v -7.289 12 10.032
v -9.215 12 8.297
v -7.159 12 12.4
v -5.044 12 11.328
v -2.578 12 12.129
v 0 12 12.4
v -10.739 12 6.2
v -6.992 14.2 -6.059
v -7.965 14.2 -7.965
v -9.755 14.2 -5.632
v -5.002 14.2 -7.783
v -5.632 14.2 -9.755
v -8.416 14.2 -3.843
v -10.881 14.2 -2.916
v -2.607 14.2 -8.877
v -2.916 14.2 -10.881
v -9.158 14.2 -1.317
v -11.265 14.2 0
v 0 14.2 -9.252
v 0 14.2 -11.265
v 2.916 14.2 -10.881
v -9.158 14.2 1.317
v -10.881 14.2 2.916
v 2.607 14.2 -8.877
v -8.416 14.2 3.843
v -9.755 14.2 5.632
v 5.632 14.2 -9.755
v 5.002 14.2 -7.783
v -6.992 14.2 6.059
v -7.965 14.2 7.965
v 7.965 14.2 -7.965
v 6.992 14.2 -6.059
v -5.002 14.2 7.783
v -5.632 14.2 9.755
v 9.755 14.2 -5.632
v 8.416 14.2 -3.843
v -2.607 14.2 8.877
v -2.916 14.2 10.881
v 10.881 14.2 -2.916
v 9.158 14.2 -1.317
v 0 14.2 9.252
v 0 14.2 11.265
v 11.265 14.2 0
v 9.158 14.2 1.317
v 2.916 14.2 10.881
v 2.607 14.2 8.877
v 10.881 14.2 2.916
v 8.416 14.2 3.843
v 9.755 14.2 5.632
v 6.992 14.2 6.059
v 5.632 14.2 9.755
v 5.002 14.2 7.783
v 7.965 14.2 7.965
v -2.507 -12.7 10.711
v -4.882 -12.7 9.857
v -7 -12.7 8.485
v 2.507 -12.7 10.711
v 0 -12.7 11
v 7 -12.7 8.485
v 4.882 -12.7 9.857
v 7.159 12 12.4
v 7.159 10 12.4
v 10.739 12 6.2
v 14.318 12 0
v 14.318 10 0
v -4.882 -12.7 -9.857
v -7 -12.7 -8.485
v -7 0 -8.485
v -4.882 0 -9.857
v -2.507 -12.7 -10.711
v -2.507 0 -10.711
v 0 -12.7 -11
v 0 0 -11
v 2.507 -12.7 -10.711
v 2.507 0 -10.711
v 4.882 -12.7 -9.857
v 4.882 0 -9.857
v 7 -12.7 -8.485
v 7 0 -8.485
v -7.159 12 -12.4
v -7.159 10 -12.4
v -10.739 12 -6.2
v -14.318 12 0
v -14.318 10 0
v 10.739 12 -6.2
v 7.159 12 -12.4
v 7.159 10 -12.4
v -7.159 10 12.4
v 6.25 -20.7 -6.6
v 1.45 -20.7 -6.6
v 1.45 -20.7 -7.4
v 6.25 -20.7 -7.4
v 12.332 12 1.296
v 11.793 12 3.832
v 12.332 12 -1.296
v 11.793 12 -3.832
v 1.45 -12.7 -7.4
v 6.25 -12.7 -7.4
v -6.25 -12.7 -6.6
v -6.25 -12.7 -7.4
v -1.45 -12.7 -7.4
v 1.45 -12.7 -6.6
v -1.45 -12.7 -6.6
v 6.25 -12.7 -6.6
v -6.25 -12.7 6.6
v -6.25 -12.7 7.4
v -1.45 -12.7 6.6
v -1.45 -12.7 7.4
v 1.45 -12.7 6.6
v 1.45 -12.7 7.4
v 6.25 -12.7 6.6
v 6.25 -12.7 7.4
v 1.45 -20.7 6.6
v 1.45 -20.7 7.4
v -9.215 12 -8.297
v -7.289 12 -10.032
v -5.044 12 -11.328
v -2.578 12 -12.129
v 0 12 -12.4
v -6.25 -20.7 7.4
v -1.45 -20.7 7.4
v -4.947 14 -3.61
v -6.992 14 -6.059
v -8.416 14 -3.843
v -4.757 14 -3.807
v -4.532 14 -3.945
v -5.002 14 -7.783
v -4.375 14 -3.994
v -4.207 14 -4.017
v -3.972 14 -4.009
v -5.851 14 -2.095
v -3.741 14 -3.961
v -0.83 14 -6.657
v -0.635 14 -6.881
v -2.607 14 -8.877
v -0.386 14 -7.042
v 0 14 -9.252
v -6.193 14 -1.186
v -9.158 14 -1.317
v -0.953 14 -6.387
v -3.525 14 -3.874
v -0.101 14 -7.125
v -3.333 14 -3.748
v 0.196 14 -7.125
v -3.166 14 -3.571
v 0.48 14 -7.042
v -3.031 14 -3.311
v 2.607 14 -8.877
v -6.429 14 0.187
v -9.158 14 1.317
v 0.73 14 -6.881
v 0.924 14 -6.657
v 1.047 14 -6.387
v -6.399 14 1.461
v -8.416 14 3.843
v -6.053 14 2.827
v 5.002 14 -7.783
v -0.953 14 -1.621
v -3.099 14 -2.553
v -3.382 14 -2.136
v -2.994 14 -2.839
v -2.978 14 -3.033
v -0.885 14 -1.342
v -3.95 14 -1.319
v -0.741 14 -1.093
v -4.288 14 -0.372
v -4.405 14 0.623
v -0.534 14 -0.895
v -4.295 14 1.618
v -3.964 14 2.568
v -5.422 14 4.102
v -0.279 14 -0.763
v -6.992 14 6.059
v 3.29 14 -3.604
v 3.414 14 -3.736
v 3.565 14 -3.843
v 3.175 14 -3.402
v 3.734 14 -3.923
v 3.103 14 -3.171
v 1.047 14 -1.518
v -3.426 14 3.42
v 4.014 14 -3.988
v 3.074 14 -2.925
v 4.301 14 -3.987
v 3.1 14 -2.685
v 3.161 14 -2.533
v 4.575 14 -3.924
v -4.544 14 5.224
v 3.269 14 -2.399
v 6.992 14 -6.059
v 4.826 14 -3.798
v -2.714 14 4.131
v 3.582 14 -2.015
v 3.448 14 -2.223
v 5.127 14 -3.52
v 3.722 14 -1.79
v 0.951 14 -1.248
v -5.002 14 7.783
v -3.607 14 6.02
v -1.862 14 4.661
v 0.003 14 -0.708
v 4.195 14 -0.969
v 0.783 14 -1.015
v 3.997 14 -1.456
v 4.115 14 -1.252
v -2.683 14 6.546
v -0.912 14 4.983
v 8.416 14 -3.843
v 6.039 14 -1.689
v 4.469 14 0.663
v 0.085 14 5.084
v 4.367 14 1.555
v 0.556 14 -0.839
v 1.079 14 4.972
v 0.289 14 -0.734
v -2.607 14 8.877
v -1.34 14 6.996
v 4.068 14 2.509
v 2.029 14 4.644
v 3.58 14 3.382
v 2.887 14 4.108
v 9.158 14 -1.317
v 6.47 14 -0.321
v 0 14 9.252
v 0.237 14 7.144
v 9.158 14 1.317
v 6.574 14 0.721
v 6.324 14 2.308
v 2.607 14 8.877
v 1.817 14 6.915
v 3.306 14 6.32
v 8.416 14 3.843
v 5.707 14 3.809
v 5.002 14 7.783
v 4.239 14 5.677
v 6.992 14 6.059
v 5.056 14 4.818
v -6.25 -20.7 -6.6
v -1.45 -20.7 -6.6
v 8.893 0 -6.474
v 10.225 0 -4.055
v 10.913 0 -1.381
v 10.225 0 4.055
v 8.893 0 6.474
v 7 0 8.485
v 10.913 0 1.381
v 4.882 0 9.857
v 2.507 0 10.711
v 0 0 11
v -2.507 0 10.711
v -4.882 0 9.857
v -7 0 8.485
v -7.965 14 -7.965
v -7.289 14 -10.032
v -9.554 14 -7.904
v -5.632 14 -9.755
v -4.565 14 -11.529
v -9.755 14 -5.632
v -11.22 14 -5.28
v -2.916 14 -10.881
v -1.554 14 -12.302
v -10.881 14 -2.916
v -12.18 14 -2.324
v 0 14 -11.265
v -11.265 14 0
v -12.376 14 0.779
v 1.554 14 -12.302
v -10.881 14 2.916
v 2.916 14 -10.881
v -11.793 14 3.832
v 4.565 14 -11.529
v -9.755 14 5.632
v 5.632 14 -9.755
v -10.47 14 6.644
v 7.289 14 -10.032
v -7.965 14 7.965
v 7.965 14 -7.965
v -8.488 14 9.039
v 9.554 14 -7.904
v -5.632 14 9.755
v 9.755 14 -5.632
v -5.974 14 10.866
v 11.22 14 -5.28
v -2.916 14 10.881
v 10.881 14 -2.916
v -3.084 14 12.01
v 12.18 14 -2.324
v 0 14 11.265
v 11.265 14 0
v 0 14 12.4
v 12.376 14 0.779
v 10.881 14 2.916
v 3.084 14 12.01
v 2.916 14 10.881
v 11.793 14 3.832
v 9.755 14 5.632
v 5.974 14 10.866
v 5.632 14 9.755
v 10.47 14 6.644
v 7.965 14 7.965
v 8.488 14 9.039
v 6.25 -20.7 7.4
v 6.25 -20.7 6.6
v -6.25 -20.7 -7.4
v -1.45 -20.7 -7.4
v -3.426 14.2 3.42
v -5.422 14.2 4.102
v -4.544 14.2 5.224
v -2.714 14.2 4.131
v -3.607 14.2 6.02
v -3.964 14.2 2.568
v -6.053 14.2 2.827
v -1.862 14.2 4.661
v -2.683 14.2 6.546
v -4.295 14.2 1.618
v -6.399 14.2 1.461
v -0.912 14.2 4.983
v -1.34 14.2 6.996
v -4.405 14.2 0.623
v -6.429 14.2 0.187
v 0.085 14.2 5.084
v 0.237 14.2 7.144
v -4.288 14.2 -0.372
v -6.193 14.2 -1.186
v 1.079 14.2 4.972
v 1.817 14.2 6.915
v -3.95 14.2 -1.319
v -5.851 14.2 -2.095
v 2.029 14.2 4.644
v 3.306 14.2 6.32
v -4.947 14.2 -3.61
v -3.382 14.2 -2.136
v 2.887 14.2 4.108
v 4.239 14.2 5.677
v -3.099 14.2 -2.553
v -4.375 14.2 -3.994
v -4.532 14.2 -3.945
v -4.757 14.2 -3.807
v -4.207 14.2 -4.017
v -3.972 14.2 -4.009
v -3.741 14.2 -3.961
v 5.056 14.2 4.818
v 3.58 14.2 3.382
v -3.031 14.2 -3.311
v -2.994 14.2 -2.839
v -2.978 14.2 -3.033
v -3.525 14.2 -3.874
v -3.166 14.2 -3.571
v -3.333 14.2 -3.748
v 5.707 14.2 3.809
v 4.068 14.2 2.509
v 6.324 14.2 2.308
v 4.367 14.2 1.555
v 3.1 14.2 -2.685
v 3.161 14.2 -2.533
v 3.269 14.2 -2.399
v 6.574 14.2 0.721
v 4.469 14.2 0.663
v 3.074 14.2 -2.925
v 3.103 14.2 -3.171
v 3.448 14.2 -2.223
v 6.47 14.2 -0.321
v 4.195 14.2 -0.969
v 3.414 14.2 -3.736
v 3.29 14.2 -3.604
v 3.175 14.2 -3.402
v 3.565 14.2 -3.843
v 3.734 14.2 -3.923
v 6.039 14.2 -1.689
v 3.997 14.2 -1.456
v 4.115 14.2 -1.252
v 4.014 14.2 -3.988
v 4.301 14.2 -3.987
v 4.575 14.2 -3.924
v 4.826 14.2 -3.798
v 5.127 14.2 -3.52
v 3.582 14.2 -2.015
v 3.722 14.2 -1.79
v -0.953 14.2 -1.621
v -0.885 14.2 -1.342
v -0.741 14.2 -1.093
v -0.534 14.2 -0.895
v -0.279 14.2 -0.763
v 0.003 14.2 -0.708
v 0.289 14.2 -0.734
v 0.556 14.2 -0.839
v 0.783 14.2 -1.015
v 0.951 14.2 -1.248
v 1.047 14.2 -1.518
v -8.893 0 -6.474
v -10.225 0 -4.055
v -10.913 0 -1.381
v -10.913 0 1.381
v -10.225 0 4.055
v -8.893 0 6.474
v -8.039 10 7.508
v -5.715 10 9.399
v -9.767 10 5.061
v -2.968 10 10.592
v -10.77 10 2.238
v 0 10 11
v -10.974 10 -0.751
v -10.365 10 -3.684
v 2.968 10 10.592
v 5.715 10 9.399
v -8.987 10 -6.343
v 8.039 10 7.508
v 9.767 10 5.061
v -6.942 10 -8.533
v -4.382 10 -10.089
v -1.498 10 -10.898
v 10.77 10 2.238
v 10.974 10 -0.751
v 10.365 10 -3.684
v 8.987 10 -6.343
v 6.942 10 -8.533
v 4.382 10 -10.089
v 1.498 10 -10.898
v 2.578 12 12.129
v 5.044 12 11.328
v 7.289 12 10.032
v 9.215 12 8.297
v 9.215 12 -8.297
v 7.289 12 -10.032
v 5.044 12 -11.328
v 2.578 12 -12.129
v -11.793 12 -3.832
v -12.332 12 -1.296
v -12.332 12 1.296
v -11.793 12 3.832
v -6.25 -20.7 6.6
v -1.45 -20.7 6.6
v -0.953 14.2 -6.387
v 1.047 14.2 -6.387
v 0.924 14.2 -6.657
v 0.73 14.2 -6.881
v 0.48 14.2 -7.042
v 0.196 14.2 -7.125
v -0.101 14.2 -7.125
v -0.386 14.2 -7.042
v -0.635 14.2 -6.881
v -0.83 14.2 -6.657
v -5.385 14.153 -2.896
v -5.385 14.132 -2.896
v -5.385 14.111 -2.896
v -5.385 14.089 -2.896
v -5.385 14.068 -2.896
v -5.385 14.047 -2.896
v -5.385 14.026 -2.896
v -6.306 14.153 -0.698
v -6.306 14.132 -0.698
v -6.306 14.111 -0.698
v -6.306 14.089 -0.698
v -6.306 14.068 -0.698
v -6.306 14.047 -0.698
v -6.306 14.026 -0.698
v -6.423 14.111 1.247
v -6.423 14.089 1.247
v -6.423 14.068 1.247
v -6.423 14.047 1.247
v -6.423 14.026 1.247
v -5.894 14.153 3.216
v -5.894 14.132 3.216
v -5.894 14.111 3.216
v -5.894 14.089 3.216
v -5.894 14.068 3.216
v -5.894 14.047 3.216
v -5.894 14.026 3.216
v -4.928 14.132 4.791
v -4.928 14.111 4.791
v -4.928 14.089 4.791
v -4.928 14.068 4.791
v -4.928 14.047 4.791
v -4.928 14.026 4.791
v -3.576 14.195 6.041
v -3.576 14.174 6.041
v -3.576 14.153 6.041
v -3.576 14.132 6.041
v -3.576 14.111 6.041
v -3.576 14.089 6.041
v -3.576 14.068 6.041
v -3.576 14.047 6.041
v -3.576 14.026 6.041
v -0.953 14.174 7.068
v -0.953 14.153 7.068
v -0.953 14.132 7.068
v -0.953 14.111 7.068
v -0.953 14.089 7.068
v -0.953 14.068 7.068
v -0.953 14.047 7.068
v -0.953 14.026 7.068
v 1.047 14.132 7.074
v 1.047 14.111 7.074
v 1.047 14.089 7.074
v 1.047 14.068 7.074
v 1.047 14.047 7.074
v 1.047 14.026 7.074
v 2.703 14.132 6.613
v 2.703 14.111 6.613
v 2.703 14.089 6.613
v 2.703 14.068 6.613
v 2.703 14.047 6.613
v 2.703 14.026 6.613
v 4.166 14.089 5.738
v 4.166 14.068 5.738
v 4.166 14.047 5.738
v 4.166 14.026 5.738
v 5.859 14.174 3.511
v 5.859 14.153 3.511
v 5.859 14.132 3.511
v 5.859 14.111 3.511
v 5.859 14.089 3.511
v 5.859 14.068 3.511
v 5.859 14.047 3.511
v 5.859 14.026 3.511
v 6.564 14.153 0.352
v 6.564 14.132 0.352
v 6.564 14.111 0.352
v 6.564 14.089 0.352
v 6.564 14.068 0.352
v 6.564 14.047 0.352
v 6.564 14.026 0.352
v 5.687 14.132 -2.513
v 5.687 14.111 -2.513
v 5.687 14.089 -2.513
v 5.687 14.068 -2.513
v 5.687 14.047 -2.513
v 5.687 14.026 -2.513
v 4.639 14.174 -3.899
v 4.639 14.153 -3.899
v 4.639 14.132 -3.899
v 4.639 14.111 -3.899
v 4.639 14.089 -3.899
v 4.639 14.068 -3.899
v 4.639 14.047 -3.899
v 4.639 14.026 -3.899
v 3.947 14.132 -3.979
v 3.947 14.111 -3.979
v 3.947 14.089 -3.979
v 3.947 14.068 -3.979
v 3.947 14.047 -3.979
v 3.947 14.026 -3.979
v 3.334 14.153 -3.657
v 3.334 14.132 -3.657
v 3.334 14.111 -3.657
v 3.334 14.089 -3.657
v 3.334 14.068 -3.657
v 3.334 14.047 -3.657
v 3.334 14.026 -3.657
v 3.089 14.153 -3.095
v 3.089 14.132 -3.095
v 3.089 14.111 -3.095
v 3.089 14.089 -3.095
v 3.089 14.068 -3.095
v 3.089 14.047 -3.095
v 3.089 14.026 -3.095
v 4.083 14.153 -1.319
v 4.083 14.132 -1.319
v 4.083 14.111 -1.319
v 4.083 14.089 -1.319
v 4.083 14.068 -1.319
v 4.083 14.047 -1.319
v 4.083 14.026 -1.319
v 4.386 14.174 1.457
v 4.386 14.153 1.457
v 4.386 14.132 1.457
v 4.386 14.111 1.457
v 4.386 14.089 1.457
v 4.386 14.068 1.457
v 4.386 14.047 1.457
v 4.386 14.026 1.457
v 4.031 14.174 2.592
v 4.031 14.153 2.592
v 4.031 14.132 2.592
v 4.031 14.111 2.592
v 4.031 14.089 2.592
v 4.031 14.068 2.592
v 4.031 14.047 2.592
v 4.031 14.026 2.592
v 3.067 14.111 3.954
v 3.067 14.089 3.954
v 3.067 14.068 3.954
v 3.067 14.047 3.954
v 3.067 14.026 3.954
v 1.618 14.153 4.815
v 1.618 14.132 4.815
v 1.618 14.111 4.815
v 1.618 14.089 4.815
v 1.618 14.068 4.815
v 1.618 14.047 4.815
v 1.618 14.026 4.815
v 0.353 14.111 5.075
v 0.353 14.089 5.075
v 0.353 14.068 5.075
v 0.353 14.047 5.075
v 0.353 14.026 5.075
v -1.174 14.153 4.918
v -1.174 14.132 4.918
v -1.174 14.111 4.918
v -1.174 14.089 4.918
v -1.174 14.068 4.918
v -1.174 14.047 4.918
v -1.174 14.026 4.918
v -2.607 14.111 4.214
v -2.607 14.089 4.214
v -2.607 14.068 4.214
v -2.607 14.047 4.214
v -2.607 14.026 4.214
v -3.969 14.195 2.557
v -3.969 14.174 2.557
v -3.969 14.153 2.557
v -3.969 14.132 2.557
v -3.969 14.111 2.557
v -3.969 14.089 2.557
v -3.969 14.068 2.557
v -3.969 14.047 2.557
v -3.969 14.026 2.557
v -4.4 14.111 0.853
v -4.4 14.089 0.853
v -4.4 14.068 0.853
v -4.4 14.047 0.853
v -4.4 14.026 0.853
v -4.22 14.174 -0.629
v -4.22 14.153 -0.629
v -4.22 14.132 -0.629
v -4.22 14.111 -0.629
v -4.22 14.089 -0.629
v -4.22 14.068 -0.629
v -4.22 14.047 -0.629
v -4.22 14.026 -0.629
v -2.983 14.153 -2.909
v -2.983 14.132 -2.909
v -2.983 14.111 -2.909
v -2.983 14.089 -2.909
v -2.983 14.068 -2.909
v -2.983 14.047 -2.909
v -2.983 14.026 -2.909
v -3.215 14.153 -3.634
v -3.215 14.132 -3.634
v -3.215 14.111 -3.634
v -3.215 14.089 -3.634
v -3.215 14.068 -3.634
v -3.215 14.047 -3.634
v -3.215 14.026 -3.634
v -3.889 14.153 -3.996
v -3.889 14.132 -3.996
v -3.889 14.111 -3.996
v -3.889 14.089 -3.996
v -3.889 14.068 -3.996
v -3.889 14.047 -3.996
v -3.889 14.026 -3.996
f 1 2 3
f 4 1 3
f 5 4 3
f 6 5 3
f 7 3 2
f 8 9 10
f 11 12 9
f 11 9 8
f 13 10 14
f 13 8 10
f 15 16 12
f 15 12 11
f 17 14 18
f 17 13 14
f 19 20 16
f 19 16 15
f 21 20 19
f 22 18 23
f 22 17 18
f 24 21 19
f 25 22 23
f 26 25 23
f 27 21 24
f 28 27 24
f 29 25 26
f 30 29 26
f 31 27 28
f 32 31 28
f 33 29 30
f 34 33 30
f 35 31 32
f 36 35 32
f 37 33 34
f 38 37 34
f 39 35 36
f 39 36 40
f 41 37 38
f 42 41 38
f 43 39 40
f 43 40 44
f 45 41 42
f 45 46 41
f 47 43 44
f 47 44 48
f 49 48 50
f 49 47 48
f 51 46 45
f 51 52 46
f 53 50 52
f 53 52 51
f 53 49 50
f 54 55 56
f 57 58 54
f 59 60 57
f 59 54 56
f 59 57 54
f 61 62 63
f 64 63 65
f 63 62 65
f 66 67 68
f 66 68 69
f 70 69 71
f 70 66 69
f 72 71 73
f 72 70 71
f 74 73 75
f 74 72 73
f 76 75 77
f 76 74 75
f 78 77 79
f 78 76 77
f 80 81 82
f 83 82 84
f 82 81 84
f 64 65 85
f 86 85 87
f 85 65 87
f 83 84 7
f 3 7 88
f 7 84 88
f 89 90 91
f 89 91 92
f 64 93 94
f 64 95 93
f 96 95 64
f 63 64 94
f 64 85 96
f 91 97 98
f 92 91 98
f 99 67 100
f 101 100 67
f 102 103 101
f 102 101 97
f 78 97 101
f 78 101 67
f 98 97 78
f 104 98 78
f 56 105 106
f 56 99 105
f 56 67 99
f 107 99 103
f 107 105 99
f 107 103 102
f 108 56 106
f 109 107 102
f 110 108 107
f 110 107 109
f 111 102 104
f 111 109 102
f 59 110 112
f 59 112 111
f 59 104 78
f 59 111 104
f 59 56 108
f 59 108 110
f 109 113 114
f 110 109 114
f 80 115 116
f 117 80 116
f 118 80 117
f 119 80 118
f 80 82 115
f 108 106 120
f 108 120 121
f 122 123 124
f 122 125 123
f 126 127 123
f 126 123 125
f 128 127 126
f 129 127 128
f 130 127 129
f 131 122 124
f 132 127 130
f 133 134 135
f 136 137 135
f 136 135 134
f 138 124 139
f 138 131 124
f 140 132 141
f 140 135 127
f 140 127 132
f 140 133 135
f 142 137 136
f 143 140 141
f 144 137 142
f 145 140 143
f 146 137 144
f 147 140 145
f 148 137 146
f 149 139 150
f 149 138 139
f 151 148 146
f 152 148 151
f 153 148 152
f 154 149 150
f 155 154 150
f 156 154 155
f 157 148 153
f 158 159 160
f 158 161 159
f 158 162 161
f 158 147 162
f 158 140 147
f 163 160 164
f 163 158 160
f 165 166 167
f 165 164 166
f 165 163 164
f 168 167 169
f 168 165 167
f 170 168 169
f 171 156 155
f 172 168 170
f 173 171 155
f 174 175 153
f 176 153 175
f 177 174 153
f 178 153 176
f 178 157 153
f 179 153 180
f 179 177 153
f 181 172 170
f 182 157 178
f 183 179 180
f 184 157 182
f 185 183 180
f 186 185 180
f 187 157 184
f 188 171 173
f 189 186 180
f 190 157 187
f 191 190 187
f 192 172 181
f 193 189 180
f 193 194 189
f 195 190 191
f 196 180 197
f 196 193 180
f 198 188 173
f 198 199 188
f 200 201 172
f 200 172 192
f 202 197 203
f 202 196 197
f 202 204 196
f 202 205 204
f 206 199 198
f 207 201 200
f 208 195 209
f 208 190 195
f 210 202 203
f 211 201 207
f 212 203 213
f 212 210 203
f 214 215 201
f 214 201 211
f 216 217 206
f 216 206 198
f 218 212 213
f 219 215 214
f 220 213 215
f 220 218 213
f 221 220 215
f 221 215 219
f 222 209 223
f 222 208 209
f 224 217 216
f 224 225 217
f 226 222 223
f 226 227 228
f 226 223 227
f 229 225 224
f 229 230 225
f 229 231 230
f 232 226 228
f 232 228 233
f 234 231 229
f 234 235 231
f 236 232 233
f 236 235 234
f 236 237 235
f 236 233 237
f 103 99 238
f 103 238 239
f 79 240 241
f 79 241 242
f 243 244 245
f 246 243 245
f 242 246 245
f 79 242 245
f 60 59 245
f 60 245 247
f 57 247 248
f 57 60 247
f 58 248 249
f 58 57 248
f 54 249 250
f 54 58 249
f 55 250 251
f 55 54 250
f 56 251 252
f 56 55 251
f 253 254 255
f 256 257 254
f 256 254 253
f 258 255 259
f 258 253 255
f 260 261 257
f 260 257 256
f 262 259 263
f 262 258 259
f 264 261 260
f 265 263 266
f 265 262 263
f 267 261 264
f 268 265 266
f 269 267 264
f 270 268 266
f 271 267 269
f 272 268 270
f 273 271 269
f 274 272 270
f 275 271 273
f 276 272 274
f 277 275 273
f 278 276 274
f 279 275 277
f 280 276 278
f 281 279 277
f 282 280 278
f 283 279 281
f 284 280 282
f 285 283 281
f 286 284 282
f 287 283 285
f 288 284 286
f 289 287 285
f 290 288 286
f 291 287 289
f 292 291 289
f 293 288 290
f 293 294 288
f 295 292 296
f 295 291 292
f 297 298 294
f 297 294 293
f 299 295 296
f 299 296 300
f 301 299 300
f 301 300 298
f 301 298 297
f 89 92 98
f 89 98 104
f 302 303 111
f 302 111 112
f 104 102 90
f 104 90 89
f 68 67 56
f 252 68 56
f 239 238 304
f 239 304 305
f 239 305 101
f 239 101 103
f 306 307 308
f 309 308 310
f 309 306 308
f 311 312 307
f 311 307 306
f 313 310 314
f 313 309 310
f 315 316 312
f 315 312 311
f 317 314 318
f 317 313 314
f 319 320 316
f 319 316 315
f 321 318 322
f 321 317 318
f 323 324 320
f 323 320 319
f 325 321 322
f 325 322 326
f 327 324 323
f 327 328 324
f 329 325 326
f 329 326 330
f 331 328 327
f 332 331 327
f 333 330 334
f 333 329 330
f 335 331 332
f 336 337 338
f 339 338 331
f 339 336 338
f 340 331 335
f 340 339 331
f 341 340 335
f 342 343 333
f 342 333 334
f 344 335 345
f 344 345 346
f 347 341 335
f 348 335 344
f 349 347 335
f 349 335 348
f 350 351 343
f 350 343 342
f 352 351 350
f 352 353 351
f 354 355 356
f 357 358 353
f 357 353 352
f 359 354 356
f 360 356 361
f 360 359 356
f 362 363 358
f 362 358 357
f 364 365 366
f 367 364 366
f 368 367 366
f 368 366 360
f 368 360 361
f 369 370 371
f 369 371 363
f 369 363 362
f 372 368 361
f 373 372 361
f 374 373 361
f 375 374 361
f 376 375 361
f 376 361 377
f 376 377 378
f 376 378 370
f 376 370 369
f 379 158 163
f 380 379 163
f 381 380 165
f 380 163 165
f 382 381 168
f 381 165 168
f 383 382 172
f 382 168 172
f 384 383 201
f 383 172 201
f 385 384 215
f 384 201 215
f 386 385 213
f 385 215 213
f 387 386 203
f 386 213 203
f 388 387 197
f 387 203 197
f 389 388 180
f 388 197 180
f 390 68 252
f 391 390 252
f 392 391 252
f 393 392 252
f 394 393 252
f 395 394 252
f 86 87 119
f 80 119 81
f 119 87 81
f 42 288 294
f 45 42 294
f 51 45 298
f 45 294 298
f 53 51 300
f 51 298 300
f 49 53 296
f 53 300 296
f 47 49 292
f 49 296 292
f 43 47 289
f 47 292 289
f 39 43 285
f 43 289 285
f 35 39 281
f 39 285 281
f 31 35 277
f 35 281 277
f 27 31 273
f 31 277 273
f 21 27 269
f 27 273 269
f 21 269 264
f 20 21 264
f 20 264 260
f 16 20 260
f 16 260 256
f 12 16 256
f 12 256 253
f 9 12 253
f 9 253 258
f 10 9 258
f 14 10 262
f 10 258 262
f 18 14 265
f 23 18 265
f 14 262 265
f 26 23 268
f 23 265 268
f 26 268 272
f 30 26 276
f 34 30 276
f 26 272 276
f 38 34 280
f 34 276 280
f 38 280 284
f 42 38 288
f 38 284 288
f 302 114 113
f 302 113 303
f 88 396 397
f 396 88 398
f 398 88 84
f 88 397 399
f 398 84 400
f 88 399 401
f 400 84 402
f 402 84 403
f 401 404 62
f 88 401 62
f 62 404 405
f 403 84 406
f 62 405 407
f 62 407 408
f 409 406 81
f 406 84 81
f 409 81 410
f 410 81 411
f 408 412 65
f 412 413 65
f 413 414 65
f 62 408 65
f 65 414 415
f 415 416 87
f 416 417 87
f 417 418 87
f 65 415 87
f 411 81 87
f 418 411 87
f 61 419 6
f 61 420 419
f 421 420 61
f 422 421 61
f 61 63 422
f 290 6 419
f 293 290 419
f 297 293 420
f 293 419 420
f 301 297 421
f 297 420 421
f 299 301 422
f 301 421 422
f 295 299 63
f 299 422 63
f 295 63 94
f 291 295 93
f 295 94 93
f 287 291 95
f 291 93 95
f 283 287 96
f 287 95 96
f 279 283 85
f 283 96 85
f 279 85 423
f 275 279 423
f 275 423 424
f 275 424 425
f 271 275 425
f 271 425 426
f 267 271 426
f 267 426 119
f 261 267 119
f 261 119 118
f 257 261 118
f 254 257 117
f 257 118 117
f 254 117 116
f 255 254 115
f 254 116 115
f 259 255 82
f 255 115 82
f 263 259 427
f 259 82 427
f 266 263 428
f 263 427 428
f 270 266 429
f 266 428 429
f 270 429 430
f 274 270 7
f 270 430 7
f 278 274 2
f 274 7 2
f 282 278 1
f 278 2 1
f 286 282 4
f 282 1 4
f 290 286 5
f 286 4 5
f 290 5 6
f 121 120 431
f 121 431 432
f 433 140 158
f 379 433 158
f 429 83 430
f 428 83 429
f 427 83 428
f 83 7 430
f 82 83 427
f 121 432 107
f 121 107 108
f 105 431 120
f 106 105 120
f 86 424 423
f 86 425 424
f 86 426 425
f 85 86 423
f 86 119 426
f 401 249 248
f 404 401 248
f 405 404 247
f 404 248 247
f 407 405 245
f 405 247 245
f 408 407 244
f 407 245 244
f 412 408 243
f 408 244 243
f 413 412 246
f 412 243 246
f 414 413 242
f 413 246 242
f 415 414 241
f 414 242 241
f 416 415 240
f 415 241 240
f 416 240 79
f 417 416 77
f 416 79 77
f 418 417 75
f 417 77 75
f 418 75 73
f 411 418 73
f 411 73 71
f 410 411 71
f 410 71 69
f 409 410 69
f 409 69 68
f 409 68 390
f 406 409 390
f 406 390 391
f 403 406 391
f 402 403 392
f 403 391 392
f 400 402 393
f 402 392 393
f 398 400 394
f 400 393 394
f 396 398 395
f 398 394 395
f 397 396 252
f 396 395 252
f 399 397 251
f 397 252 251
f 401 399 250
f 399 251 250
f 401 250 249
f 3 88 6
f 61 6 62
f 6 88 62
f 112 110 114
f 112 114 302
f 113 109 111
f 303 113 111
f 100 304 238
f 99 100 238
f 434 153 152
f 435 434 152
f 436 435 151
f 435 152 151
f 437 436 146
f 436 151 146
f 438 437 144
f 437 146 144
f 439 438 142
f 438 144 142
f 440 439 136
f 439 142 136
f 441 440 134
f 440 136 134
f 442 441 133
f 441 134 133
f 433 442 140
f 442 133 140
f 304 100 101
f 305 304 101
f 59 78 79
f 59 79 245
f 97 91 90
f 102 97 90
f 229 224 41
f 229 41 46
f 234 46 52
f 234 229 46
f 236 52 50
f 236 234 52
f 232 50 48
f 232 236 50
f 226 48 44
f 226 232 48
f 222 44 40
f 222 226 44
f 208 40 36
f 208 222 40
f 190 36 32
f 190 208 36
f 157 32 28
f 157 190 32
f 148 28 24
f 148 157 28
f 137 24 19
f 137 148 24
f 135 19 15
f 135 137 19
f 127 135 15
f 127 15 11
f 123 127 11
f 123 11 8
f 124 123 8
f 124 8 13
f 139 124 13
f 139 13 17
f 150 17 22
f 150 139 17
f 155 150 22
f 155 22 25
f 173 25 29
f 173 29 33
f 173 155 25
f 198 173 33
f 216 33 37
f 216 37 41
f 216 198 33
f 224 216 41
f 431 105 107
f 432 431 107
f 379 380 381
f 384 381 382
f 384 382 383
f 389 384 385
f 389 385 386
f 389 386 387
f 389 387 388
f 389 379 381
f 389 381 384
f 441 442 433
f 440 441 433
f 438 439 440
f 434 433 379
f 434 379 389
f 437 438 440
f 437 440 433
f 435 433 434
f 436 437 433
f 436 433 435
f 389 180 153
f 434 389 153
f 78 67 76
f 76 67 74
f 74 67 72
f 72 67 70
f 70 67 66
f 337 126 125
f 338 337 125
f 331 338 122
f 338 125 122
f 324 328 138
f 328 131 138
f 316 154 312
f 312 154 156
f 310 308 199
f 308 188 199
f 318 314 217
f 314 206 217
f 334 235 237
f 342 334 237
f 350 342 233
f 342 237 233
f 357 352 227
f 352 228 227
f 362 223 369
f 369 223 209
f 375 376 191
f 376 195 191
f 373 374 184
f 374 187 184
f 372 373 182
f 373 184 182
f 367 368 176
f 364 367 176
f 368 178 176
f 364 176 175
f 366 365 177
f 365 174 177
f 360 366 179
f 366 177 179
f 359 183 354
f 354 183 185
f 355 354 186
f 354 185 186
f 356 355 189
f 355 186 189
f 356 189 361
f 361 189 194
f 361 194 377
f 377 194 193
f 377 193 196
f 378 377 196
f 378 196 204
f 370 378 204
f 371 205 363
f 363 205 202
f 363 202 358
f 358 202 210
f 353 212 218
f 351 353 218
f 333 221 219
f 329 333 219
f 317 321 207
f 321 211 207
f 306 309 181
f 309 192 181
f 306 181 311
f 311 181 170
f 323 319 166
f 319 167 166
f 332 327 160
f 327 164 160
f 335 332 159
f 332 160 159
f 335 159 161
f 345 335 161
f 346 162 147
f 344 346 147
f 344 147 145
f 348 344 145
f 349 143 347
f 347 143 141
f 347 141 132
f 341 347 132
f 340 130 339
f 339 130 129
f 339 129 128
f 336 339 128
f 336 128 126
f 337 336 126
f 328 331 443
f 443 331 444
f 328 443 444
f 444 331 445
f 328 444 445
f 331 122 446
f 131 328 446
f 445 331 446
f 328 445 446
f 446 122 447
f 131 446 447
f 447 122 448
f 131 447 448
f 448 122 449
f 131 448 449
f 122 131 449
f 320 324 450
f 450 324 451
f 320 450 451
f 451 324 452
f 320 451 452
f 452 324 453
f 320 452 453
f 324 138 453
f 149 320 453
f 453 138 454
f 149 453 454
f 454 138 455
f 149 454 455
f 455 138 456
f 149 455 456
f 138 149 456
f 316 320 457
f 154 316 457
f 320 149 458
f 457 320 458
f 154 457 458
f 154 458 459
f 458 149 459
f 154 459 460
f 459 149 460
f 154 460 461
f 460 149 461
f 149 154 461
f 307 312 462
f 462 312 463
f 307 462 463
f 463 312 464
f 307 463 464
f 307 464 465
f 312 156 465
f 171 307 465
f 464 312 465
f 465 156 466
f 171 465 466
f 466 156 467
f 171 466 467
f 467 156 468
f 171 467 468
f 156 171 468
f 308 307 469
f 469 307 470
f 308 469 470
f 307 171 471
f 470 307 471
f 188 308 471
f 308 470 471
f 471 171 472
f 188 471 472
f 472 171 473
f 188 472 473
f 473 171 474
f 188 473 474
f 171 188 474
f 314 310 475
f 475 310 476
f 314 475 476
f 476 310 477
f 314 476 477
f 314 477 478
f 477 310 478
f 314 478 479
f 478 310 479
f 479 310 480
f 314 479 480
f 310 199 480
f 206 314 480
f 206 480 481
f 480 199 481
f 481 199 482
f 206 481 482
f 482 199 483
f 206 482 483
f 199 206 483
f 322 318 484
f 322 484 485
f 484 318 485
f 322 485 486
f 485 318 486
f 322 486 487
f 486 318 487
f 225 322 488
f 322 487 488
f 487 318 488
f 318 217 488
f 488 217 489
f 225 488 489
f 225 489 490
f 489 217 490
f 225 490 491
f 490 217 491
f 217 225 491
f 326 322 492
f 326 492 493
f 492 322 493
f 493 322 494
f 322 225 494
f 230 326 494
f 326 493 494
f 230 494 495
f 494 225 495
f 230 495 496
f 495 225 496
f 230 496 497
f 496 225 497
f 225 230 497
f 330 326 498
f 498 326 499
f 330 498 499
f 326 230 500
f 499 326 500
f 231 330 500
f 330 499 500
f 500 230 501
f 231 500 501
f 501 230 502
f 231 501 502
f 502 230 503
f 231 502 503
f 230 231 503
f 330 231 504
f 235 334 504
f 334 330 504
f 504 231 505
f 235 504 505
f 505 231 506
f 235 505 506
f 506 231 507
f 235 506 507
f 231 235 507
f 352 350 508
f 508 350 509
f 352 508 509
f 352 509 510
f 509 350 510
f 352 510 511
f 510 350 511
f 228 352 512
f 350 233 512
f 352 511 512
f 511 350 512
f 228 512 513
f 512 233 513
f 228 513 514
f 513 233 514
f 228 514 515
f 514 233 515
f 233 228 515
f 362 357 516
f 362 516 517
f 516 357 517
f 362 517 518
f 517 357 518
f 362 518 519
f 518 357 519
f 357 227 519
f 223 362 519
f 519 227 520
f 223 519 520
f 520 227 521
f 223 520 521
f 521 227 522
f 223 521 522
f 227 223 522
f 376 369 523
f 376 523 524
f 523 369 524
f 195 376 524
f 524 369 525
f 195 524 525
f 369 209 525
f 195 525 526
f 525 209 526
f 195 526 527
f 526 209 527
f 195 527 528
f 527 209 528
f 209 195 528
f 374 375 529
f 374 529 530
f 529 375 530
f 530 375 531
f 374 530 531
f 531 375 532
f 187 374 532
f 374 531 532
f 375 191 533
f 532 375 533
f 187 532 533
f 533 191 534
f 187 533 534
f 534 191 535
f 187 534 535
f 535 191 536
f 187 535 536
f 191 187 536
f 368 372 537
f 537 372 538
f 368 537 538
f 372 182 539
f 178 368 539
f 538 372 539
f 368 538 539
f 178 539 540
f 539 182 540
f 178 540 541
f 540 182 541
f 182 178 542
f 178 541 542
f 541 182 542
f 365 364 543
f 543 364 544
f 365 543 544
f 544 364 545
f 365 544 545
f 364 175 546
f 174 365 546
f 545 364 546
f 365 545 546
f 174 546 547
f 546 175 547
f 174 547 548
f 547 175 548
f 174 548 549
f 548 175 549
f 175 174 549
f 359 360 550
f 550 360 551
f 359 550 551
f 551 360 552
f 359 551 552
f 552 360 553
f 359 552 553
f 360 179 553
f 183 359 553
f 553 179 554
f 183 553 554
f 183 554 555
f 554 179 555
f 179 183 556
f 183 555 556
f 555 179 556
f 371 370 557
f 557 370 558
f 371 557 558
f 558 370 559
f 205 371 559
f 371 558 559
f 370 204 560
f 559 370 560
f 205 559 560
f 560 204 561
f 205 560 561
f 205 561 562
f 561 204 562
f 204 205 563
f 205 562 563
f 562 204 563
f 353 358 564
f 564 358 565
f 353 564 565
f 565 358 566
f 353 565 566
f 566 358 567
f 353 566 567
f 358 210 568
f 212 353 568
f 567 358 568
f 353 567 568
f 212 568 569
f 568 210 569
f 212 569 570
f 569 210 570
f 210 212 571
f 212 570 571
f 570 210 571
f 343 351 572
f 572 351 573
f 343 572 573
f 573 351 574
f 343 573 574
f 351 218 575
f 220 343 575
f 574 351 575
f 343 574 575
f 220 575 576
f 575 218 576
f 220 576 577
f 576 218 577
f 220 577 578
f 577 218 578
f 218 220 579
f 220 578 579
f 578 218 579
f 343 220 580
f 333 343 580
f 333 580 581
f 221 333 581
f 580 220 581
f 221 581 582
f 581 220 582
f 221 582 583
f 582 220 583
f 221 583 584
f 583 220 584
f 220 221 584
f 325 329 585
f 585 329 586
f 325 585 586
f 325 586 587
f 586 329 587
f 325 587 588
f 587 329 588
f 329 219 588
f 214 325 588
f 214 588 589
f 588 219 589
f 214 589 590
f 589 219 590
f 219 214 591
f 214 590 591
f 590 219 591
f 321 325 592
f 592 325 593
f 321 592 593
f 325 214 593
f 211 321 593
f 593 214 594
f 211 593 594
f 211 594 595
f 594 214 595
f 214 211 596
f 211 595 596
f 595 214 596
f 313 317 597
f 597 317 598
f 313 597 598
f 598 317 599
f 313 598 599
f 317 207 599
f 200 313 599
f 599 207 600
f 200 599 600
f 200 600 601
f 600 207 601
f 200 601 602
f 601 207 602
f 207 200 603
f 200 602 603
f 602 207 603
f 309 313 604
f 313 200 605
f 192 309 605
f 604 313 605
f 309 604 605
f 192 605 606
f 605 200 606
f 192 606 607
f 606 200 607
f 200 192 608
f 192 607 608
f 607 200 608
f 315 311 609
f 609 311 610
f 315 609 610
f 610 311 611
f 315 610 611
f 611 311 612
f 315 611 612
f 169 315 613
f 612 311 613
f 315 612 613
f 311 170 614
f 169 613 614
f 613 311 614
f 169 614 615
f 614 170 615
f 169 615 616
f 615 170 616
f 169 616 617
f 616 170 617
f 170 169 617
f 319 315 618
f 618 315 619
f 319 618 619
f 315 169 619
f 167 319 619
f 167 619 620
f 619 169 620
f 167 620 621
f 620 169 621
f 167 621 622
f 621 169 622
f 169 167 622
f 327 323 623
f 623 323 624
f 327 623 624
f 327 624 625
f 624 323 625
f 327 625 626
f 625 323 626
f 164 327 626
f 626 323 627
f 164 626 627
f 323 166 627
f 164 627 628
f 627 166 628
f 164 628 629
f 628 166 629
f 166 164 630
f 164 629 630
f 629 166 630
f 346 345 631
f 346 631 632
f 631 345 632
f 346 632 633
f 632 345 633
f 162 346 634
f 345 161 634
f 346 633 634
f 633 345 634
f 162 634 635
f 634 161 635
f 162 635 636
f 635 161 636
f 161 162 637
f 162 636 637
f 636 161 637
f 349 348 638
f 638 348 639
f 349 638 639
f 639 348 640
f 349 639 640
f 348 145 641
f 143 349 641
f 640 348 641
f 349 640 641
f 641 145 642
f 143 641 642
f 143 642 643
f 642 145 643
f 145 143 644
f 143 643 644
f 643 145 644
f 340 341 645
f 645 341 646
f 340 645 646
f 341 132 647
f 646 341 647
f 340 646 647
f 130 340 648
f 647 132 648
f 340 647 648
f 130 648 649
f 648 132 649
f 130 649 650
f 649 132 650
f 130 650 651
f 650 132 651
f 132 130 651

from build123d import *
from build123d.topology import SkipClean

# Parameters (mm, degrees)
SKETCH_1_R      = 11
EXTRUDE_1_DEPTH = 10
EXTRUDE_2_DEPTH = 2
SKETCH_3_R      = 12.4
EXTRUDE_3_DEPTH = 2
SKETCH_5_R      = 11.264641855
SKETCH_5_R_2    = 9.25178024
EXTRUDE_4_DEPTH = 0.2
EXTRUDE_START   = 12.7
SKETCH_6_W      = 14
SKETCH_6_H      = 16.970562748
EXTRUDE_5_DEPTH = 12.7
SKETCH_7_W      = 4.8
SKETCH_7_H      = 0.8
EXTRUDE_6_DEPTH = 8


with BuildPart() as part:
    # 草图1 → 凸台-拉伸1 (new body)
    with BuildSketch(Plane(origin=(0, 0, 0), x_dir=(1, 0, 0), z_dir=(0, 1, 0))):
        with Locations(Location((0, 0, 0), (0, 0, 270))):
            Circle(SKETCH_1_R)
    extrude(amount=EXTRUDE_1_DEPTH)

    # 草图2 → 凸台-拉伸2 (add)
    with BuildSketch(Plane(origin=(0, 10, 0), x_dir=(1, 0, 0), z_dir=(0, 1, 0))):
        Polygon((7.159143338, -12.4), (14.318286676, 0), (7.159143338, 12.4), (-7.159143338, 12.4), (-14.318286676, 0), (-7.159143338, -12.4), align=None)
    extrude(amount=EXTRUDE_2_DEPTH)

    # 草图3 → 凸台-拉伸3 (add)
    with BuildSketch(Plane(origin=(0, 12, 0), x_dir=(1, 0, 0), z_dir=(0, 1, 0))):
        with Locations(Location((0, 0, 0), (0, 0, 270))):
            Circle(SKETCH_3_R)
    extrude(amount=EXTRUDE_3_DEPTH)

    # 草图5 → 凸台-拉伸4 (add)
    # profile 1 of 3: a face of its own
    with BuildSketch(Plane(origin=(0, 14, 0), x_dir=(1, 0, 0), z_dir=(0, 1, 0))):
        with Locations(Location((0, 0, 0), (0, 0, 270))):
            Circle(SKETCH_5_R)
        with Locations(Location((0, 0, 0), (0, 0, 270))):
            Circle(SKETCH_5_R_2, mode=Mode.SUBTRACT)
    # profile 2 of 3: a face of its own
    with BuildSketch(Plane(origin=(0, 14, 0), x_dir=(1, 0, 0), z_dir=(0, 1, 0))):
        with BuildLine():
            add(Edge.make_bspline(
                [(-4.531930976, 3.945494062), (-4.931928742, 3.77750387), (-5.311682001, 2.960342277), (-5.991141543, 1.949169031), (-6.396271783, 0.524296362), (-6.537370068, -1.286255496), (-5.840461103, -3.78050422), (-3.973519682, -6.124461985), (-1.238390819, -7.169357291), (1.520794025, -7.173420809), (4.211359131, -6.084158365), (6.086695891, -3.477668911), (6.905357115, -0.367726074), (5.905130942, 2.059620867), (5.028765713, 3.962793153), (3.875298238, 4.041756072), (3.29141668, 3.696344725), (3.048713235, 3.141954909), (3.061357601, 2.526413251), (3.488195445, 2.234620856), (3.679341437, 1.769390855), (4.169012756, 1.362737183), (4.223062658, 0.659416394), (4.515624189, -0.227999974), (4.461264715, -1.369716105), (4.079353431, -2.593948769), (3.30330561, -3.914996189), (1.935894526, -4.815540791), (0.278175009, -5.149155893), (-1.219670545, -5.004826573), (-2.832376043, -4.211829708), (-4.044284214, -2.735827002), (-4.496323869, -0.944601433), (-4.311986077, 0.553939945), (-3.824616639, 1.652646984), (-3.227775265, 2.283187209), (-2.88981713, 2.939912012), (-3.127884309, 3.699186823), (-3.820836776, 4.050553792), (-4.341264245, 4.025569861), (-4.531930976, 3.945494062)],
                knots=[0, 0, 0, 0, 0.023973889, 0.04155419, 0.066468029, 0.100998981, 0.137141746, 0.20193186, 0.251863159, 0.287326725, 0.347456235, 0.39706454, 0.454431749, 0.507559151, 0.538353321, 0.553211894, 0.562961677, 0.572498599, 0.584637384, 0.591443225, 0.598437343, 0.610871675, 0.62326923, 0.634065974, 0.660780987, 0.681865173, 0.702097016, 0.741217122, 0.764094276, 0.791316499, 0.819614085, 0.857637757, 0.888785096, 0.915262001, 0.936720816, 0.951197394, 0.961514557, 0.974340001, 0.988572379, 1, 1, 1, 1], degree=3))
        make_face()
    # profile 3 of 3: a face of its own
    with BuildSketch(Plane(origin=(0, 14, 0), x_dir=(1, 0, 0), z_dir=(0, 1, 0))):
        with BuildLine():
            Line((-0.953053843, 6.387223198), (-0.953053843, 1.620615101))
            ThreePointArc((-0.953053843, 1.620615101), (0.003085924, 0.707999599), (1.047457876, 1.518158555))
            Line((1.047457876, 1.518158555), (1.047457876, 6.387223198))
            ThreePointArc((1.047457876, 6.387223198), (0.047202017, 7.135854771), (-0.953053843, 6.387223198))
        make_face()
    extrude(amount=EXTRUDE_4_DEPTH)

    # 草图6 → 凸台-拉伸5 (add)
    with SkipClean():  # the faces are left unmerged after this step: merging them gives an invalid solid
        with BuildSketch(Plane.XZ.offset(EXTRUDE_START)):
            Rectangle(SKETCH_6_W, SKETCH_6_H)
            with BuildLine():
                Line((-7, 8.485281374), (7, 8.485281374))
                ThreePointArc((7, 8.485281374), (0, 11), (-7, 8.485281374))
            make_face()
            with BuildLine():
                ThreePointArc((-7, -8.485281374), (0, -11), (7, -8.485281374))
                Line((7, -8.485281374), (-7, -8.485281374))
            make_face()
        extrude(amount=-EXTRUDE_5_DEPTH)

    # 草图7 → 凸台-拉伸6 (add)
    with SkipClean():  # the faces are left unmerged after this step: merging them gives an invalid solid
        with BuildSketch(Plane.XZ.offset(12.7)):
            with Locations((3.85, 7)):
                Rectangle(SKETCH_7_W, SKETCH_7_H)
            with Locations((-3.85, 7)):
                Rectangle(SKETCH_7_W, SKETCH_7_H)
            with Locations((3.85, -7)):
                Rectangle(SKETCH_7_W, SKETCH_7_H)
            with Locations((-3.85, -7)):
                Rectangle(SKETCH_7_W, SKETCH_7_H)
        extrude(amount=EXTRUDE_6_DEPTH)


solid = part.part
